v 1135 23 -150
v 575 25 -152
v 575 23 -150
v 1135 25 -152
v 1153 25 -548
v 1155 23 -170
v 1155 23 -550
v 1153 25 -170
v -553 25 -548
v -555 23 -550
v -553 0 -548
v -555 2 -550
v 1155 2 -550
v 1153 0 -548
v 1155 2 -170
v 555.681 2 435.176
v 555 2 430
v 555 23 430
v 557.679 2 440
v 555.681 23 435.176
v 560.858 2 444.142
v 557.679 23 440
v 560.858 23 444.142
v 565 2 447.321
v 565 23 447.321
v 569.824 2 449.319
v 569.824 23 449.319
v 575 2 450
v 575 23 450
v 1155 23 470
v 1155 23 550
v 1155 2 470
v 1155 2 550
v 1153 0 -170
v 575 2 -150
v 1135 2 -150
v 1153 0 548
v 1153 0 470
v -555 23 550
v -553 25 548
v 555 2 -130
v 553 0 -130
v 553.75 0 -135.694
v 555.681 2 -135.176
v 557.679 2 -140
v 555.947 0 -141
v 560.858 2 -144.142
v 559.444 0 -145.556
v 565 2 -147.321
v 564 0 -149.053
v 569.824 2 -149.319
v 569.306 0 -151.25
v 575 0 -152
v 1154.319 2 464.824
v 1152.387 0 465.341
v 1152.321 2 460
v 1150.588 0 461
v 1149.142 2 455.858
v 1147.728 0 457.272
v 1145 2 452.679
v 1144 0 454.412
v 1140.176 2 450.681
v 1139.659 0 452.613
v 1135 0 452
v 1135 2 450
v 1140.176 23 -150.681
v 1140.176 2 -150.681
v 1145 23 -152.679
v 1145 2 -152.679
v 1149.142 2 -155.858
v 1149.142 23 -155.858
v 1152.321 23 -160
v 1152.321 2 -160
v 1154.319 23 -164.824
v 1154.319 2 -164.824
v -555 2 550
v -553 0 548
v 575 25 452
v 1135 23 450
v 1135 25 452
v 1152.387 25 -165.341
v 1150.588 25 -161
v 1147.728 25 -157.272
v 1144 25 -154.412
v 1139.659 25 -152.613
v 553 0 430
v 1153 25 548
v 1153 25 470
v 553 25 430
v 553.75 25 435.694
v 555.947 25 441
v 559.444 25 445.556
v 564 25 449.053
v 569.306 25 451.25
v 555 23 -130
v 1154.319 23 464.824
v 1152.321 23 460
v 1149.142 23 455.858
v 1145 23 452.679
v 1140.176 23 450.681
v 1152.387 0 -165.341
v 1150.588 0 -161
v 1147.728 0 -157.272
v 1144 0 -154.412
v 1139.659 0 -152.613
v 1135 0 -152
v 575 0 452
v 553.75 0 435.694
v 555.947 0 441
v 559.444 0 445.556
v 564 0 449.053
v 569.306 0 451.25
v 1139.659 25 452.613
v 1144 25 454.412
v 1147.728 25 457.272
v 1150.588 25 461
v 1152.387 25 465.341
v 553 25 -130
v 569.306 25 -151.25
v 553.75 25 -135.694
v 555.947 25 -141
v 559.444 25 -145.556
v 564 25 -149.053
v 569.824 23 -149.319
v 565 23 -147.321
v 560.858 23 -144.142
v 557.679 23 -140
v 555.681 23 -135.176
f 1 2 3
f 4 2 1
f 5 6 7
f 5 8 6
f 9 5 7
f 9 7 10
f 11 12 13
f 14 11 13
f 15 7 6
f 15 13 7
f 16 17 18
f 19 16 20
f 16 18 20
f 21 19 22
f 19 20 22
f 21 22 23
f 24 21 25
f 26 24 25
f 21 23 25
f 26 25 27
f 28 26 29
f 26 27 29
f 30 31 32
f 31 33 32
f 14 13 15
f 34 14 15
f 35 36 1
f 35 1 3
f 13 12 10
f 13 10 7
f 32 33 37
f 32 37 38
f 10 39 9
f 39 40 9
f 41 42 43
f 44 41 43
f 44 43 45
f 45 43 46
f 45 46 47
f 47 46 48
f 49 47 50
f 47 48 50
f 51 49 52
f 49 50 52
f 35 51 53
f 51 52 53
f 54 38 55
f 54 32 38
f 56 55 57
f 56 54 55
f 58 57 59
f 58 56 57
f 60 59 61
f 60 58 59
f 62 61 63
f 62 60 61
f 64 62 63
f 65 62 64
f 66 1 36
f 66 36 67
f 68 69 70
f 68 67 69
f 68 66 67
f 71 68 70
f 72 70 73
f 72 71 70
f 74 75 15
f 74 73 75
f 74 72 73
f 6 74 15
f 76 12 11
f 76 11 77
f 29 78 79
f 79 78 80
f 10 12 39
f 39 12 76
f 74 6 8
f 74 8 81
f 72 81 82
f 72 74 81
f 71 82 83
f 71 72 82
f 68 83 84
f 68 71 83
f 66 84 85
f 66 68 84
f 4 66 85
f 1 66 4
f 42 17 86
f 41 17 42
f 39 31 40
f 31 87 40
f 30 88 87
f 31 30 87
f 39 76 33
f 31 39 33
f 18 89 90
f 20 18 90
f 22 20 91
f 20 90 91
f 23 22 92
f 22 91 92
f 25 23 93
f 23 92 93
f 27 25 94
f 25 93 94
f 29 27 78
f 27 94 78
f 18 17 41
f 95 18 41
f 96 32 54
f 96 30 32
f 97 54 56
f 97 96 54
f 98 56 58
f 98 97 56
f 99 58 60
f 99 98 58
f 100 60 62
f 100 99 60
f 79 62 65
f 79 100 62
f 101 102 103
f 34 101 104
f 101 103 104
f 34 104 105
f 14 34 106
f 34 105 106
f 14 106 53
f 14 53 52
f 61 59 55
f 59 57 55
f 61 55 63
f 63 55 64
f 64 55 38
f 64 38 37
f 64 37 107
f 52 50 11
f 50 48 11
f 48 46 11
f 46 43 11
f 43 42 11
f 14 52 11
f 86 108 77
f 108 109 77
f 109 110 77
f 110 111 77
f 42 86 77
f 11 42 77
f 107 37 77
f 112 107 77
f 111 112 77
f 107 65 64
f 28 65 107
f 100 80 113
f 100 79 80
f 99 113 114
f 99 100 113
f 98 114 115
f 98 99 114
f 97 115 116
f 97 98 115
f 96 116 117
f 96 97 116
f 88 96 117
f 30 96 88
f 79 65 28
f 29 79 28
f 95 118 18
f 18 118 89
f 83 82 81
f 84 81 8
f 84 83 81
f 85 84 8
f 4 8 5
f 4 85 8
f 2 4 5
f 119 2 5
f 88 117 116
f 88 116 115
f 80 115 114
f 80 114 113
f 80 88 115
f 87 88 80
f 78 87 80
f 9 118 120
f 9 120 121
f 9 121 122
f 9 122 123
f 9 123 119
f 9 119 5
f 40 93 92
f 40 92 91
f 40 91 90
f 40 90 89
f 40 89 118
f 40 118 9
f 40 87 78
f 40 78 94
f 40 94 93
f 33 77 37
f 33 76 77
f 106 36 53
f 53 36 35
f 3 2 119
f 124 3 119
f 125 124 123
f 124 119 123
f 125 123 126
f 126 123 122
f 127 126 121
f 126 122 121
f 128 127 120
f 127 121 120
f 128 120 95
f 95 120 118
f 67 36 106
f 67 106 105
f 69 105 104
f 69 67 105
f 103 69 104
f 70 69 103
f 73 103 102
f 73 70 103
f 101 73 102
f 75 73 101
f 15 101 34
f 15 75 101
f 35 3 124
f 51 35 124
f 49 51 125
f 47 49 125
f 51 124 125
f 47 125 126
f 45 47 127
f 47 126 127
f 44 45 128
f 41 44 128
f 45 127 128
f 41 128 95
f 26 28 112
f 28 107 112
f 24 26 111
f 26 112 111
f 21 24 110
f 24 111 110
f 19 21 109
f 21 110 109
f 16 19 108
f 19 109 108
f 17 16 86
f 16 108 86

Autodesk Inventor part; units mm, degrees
ref_plane "YZ Plane" through (0, 0, 0) normal (1, 0, 0) x (0, 1, 0)
ref_plane "XZ Plane" through (0, 0, 0) normal (0, 1, 0) x (-1, 0, 0)
ref_plane "XY Plane" through (0, 0, 0) normal (0, 0, 1) x (1, 0, 0)
sketch "Sketch1" plane through (0, 0, 0) normal (0, 1, 0) x (-1, 0, 0)
  line L0 (555, 500) -> (-555, 500)
  line L1 (-555, 500) -> (-555, -500)
  line L2 (-555, -500) -> (555, -500)
  line L3 (555, -500) -> (555, 500)
  line L4 (555, 500) -> (-555, -500) construction
  line L5 (-555, 500) -> (555, -500) construction
  line L6 (235, 50) -> (505, 50)
  line L7 (505, 50) -> (505, 450)
  line L8 (505, 450) -> (235, 450)
  line L9 (235, 450) -> (235, 50)
  line L10 (-135, 50) -> (135, 50)
  line L11 (135, 50) -> (135, 450)
  line L12 (135, 450) -> (-135, 450)
  line L13 (-135, 450) -> (-135, 50)
  line L14 (-505, 50) -> (-235, 50)
  line L15 (-235, 50) -> (-235, 450)
  line L16 (-235, 450) -> (-505, 450)
  line L17 (-505, 450) -> (-505, 50)
  line L18 (235, -450) -> (505, -450)
  line L19 (505, -450) -> (505, -50)
  line L20 (505, -50) -> (235, -50)
  line L21 (235, -50) -> (235, -450)
  line L22 (-135, -450) -> (135, -450)
  line L23 (135, -450) -> (135, -50)
  line L24 (135, -50) -> (-135, -50)
  line L25 (-135, -50) -> (-135, -450)
  line L26 (-505, -450) -> (-235, -450)
  line L27 (-235, -450) -> (-235, -50)
  line L28 (-235, -50) -> (-505, -50)
  line L29 (-505, -50) -> (-505, -450)
  line L30 (-555, 500) -> (-1155, 500)
  line L31 (-1155, 500) -> (-1155, -500)
  line L32 (-1155, -500) -> (-555, -500)
  line L33 (-555, -500) -> (-555, 500)
  line L34 (-555, 500) -> (-1155, 500)
  line L35 (-1155, 500) -> (-1155, 450)
  line L36 (-1155, 450) -> (-555, 450)
  line L37 (-555, 450) -> (-555, 500)
  line L38 (-555, -500) -> (-1155, -500)
  line L39 (-1155, -500) -> (-1155, -450)
  line L40 (-1155, -450) -> (-555, -450)
  line L41 (-555, -450) -> (-555, -500)
  line L42 (-1155, -500) -> (555, -500)
  line L43 (555, -500) -> (555, -550)
  line L44 (555, -550) -> (-1155, -550)
  line L45 (-1155, -550) -> (-1155, -500)
  line L46 (-1155, 500) -> (555, 500)
  line L47 (555, 500) -> (555, 550)
  line L48 (555, 550) -> (-1155, 550)
  line L49 (-1155, 550) -> (-1155, 500)
  line L50 (-555, 450) -> (-1155, 450)
  line L51 (-1155, 450) -> (-1155, -150)
  line L52 (-1155, -150) -> (-555, -150)
  line L53 (-555, -150) -> (-555, 450)
  point P0 (0, 0)
  point P1 (555, -525)
  dimension "d0" = 1000
  dimension "d1" = 1110
  dimension "d2" = 400
  dimension "d3" = 270
  dimension "d4" = 50
  dimension "d5" = 50
  dimension "d8" = 370
  dimension "d11" = 500
  dimension "d14" = 600
  dimension "d15" = 50
  dimension "d16" = 50
  dimension "d17" = 50
  dimension "d18" = 50
  dimension "d19" = 600
  dimension "d26" = 0
  dimension "d27" = 0
extrude "Extrusion1" add sketch "Sketch1" along normal blind 25 contours L3 L2 L1 L0 | L0 L30 L49 L48 L47 | L1 L36 L31 L30 | L43 L44 L45 L32 L2 | L32 L31 L40 L1 | L1 L40 L31 L52 | L9 L8 L7 L6 | L13 L12 L11 L10 | L17 L16 L15 L14 | L21 L20 L19 L18 | L25 L24 L23 L22 | L29 L28 L27 L26
fillet "Fillet1" radius 20 4 edges at (555, 12.5, -150) (555, 12.5, 450) (1155, 12.5, 450) (1155, 12.5, -150)
chamfer "Chamfer1" distance 2 angle 45 20 edges at (855, 0, -150) (1149.1421, 0, -155.8579) (1155, 0, -335) (555, 0, 150) (855, 0, 450) (1149.1421, 0, 455.8579) (1155, 0, 485) (300, 0, 550) (-555, 0, 0) (300, 0, -550) (1155, 25, -335) (1149.1421, 25, -155.8579) (855, 25, -150) (555, 25, 150) (855, 25, 450) (1149.1421, 25, 455.8579) (1155, 25, 485) (300, 25, 550) (-555, 25, 0) (300, 25, -550)
equation "\"d0\" = Grundplatte_Width"
equation "\"d1\" = Grundplatte_Hight"
equation "\"d2\" = Palette_Width"
equation "\"d3\" = Palette_Hight"
equation "\"d4\" = Palette_Padding_Outer"
equation "\"d5\" = Palette_Padding_Outer"
equation "\"d8\" = Palette_Padding_Inner_X"
equation "\"d11\" = Palette_Padding_Inner_Y"
equation "\"d15\" = Palette_Padding_Outer"
equation "\"d16\" = Palette_Padding_Outer"
equation "\"d17\" = Palette_Padding_Outer"
equation "\"d18\" = Palette_Padding_Outer"
equation "\"Palette_Width\" = 400"
equation "\"Palette_Hight\" = 270"
equation "\"Palette_Padding_Outer\" = 0.5 * Palette_Padding"
equation "\"Palette_Padding_Inner_X\" = Palette_Hight + Palette_Padding"
equation "\"Palette_Padding_Inner_Y\" = Palette_Width + Palette_Padding"
equation "\"Grundplatte_Width\" = 1000"
equation "\"Grundplatte_Hight\" = 1110"
equation "\"Palette_Padding\" = 100"
properties part number "Grundplatte"
